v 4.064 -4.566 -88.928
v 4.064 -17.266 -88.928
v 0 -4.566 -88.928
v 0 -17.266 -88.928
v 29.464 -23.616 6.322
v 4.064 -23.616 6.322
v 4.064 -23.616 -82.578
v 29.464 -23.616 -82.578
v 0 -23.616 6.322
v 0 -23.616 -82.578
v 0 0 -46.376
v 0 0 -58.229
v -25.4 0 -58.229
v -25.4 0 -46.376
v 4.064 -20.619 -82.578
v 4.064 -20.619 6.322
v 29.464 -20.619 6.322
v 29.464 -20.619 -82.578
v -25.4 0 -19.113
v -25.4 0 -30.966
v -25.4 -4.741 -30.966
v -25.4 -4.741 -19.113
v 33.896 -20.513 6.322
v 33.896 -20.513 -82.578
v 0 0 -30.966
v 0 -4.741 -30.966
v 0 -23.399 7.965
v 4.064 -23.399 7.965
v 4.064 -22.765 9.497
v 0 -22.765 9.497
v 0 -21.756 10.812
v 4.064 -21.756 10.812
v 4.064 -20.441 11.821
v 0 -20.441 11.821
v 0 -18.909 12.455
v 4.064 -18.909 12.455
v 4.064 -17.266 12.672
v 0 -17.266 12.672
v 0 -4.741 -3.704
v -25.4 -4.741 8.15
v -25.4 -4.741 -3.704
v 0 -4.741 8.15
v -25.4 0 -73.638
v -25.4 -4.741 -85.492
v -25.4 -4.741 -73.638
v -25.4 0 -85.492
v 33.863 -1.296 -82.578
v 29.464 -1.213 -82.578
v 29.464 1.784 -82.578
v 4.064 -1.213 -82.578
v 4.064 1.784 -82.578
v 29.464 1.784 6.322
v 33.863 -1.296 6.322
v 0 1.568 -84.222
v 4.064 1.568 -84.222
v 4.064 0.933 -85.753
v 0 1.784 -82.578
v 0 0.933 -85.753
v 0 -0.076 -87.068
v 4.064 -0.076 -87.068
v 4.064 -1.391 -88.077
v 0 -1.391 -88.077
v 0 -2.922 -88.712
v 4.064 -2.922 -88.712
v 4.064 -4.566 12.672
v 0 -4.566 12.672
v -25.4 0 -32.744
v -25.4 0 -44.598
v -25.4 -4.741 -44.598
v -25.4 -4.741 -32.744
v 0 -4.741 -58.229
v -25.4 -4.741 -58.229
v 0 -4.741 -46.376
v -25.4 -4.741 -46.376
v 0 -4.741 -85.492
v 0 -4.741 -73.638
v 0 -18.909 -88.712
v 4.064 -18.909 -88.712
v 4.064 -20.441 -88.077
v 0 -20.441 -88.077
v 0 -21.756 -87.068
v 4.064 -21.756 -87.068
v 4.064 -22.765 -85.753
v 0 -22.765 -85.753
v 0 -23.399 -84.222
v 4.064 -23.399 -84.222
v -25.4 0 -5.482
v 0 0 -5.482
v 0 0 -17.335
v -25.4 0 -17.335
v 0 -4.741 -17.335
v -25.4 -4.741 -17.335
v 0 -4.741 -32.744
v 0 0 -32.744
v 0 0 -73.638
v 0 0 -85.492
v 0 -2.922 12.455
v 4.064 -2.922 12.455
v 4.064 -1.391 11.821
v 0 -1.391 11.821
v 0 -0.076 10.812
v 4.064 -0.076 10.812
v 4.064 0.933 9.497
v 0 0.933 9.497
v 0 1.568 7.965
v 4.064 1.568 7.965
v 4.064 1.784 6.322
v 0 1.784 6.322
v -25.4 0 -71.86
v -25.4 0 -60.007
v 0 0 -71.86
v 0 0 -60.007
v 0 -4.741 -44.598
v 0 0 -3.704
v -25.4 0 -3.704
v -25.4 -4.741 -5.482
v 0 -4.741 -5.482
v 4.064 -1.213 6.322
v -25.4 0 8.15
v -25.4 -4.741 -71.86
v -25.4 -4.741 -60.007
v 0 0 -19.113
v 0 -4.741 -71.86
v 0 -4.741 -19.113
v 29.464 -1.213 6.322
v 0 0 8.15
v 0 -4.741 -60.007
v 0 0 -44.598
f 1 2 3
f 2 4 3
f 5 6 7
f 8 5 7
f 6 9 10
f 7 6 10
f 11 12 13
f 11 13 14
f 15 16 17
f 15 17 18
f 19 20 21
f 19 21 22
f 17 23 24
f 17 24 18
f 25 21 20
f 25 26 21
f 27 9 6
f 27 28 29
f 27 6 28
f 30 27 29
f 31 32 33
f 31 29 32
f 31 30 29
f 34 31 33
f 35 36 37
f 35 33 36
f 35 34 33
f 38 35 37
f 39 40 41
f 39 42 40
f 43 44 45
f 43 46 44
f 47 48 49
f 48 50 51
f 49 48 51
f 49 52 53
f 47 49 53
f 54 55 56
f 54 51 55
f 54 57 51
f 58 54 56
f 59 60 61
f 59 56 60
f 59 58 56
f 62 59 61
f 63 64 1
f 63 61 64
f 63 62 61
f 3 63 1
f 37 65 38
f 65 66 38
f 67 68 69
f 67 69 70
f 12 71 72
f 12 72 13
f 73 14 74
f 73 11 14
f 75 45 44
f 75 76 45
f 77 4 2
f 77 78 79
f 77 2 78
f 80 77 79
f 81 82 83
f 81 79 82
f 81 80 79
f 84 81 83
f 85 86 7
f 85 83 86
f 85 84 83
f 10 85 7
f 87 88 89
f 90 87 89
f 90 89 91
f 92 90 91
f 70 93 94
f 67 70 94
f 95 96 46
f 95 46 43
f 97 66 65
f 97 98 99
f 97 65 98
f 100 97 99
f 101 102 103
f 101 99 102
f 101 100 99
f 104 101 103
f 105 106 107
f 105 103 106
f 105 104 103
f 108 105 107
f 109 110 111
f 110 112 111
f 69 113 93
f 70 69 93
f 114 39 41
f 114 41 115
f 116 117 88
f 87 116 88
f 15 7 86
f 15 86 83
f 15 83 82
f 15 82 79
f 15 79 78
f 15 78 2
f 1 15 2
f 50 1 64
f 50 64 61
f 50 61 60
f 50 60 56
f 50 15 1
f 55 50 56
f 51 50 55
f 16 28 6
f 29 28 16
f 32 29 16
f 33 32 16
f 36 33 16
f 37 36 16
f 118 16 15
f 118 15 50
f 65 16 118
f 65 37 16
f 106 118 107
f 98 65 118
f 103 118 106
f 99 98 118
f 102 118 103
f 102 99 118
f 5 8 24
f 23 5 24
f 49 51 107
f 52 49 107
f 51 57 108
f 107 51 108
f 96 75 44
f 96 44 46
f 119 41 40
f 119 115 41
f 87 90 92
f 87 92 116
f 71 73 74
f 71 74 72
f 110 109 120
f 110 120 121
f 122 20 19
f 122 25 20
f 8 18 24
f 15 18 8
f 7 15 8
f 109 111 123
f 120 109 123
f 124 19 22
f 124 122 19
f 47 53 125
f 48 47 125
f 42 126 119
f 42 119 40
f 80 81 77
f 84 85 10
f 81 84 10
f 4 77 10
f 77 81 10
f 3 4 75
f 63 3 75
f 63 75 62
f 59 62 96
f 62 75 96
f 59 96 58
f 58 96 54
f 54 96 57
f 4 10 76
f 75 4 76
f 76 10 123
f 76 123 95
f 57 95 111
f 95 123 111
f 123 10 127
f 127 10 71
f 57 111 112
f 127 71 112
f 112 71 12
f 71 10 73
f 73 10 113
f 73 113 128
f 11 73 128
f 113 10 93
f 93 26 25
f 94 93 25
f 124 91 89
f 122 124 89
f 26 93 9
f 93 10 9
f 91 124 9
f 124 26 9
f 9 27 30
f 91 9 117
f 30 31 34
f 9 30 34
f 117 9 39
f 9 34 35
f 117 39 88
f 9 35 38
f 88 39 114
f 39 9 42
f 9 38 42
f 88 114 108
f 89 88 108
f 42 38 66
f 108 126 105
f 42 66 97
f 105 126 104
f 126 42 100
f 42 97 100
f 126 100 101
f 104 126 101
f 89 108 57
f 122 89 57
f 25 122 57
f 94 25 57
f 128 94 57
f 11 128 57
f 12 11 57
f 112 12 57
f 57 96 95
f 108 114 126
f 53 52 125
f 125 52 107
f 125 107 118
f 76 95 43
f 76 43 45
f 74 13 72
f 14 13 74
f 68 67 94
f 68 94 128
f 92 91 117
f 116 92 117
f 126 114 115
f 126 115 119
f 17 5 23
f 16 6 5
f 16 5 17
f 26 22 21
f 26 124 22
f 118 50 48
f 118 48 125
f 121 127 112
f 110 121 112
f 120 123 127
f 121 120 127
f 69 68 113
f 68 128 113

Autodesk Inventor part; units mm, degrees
ref_plane "YZ Plane" through (0, 0, 0) normal (1, 0, 0) x (0, 1, 0)
ref_plane "XZ Plane" through (0, 0, 0) normal (0, 1, 0) x (-1, 0, 0)
ref_plane "XY Plane" through (0, 0, 0) normal (0, 0, 1) x (1, 0, 0)
sketch "Sketch1" plane through (0, 0, 0) normal (1, 0, 0) x (0, 1, 0)
  line L0 (-4.5658, 12.6718) -> (-17.2658, 12.6718)
  line L1 (-23.6158, 6.3218) -> (-23.6158, -82.5782)
  line L2 (-17.2658, -88.9282) -> (-4.5658, -88.9282)
  line L3 (1.7842, -82.5782) -> (1.7842, 6.3218)
  arc A0 (1.7842, 6.3218) -> (-4.5658, 12.6718) centre (-4.5658, 6.3218) ccw
  arc A1 (-17.2658, 12.6718) -> (-23.6158, 6.3218) centre (-17.2658, 6.3218) ccw
  arc A2 (-23.6158, -82.5782) -> (-17.2658, -88.9282) centre (-17.2658, -82.5782) ccw
  arc A3 (-4.5658, -88.9282) -> (1.7842, -82.5782) centre (-4.5658, -82.5782) ccw
  point P0 (0, 0)
  point P1 (1.7842, 12.6718)
  point P2 (-23.6158, -88.9282)
  point P3 (-23.6158, 12.6718)
  point P4 (1.7842, -88.9282)
  dimension "d0" = 25.4
  dimension "d1" = 101.6
  dimension "d4" = 6.35
extrude "Extrusion1" add sketch "Sketch1" along normal blind 4.064
sketch "Sketch2" plane through (4.064, 0, 0) normal (1, 0, 0) x (0, 0, -1)
  arc A0 (82.5782, -23.6158) -> (88.9282, -17.2658) centre (82.5782, -17.2658) ccw projected
  line L0 (-12.6718, -4.5658) -> (-12.6718, -17.2658) projected
  line L1 (82.5782, 1.7842) -> (-6.3218, 1.7842) projected
  line L2 (82.5782, -1.213) -> (-6.3218, -1.213)
  line L3 (-6.3218, -20.6186) -> (82.5782, -20.6186)
  line L4 (-6.3218, -20.6186) -> (82.5782, -20.6186)
  line L5 (82.5782, -20.6186) -> (82.5782, -23.6158)
  line L6 (82.5782, -23.6158) -> (-6.3218, -23.6158)
  line L7 (-6.3218, -23.6158) -> (-6.3218, -20.6186)
  line L8 (-6.3218, -1.213) -> (82.5782, -1.213)
  line L9 (82.5782, -1.213) -> (82.5782, 1.7842)
  line L10 (82.5782, 1.7842) -> (-6.3218, 1.7842)
  line L11 (-6.3218, 1.7842) -> (-6.3218, -1.213)
  point P0 (0, 0)
  dimension "d6" = 19.4056
extrude "Extrusion2" add sketch "Sketch2" along normal blind 25.4
sketch "Sketch3" plane through (4.064, -1.213, 6.3218) normal (0, 0, 1) x (1, 0, 0)
  line L0 (25.4, 2.9972) -> (25.4, 0) projected
  line L1 (25.4, 2.9972) -> (25.4, 0)
  line L2 (25.4, -19.4056) -> (25.4, -22.4028) projected
  line L3 (25.4, -22.4028) -> (29.8318, -19.2996)
  line L4 (25.4, -19.4056) -> (25.4, -22.4028)
  line L5 (0, 2.9972) -> (25.4, 2.9972) projected
  line L6 (25.4, 2.9972) -> (25.4, 0)
  line L7 (25.4, 2.9972) -> (29.8318, -0.106)
  line L8 (29.7989, -0.0829) -> (25.4, 0)
  line L9 (29.8318, -19.2996) -> (25.4, -19.4056)
  point P0 (-4.064, 1.213)
  dimension "d35" = 5.4102
  dimension "d36" = 55
  dimension "d37" = 5.4102
  dimension "d38" = 55
sketch "Sketch4" plane through (0, 0, 0) normal (-1, 0, 0) x (0, 0, 1)
  arc A0 (12.6718, -4.5658) -> (6.3218, 1.7842) centre (6.3218, -4.5658) ccw projected
  line L0 (-5.4816, 0) -> (-17.3349, 0)
  line L1 (-17.3349, 0) -> (-17.3349, -4.7413)
  line L2 (-17.3349, -4.7413) -> (-5.4816, -4.7413)
  line L3 (-5.4816, -4.7413) -> (-5.4816, 0)
  line L4 (-30.9663, 0) -> (-19.1129, 0)
  line L5 (-19.1129, 0) -> (-19.1129, -4.7413)
  line L6 (-19.1129, -4.7413) -> (-30.9663, -4.7413)
  line L7 (-30.9663, -4.7413) -> (-30.9663, 0)
  line L8 (-32.7443, 0) -> (-44.5976, 0)
  line L9 (-44.5976, -4.7413) -> (-32.7443, -4.7413)
  line L10 (-32.7443, -4.7413) -> (-32.7443, 0)
  line L11 (-44.5976, 0) -> (-44.5976, -4.7413)
  arc A1 (-82.5782, 1.7842) -> (-88.9282, -4.5658) centre (-82.5782, -4.5658) ccw projected
  line L12 (-58.2289, -4.7413) -> (-58.2289, 0)
  line L13 (-58.2289, 0) -> (-46.3756, 0)
  line L14 (-46.3756, -4.7413) -> (-58.2289, -4.7413)
  line L15 (-46.3756, 0) -> (-46.3756, -4.7413)
  line L16 (-60.0069, 0) -> (-71.8603, 0)
  line L17 (-71.8603, 0) -> (-71.8603, -4.7413)
  line L18 (-71.8603, -4.7413) -> (-60.0069, -4.7413)
  line L19 (-60.0069, -4.7413) -> (-60.0069, 0)
  line L20 (-85.4916, 0) -> (-73.6383, 0)
  line L21 (-73.6383, 0) -> (-73.6383, -4.7413)
  line L22 (-85.4916, -4.7413) -> (-85.4916, 0)
  line L23 (-73.6383, -4.7413) -> (-85.4916, -4.7413)
  line L24 (-3.7036, 0) -> (8.1497, 0)
  line L25 (8.1497, 0) -> (8.1497, -4.7413)
  line L26 (8.1497, -4.7413) -> (-3.7036, -4.7413)
  line L27 (-3.7036, -4.7413) -> (-3.7036, 0)
  point P0 (0, 0)
  dimension "d47" = 1.778
extrude "Extrusion4" add sketch "Sketch4" along normal blind 25.4
extrude "Extrusion6" add sketch "Sketch3" against normal up to surface (88.9 mm away)
sketch "Sketch8" plane through (0, -23.6158, -82.5782) normal (0, -1, 0) x (1, 0, 0)
  point P0 (0, 82.5782)
properties part number "the whole thing"
